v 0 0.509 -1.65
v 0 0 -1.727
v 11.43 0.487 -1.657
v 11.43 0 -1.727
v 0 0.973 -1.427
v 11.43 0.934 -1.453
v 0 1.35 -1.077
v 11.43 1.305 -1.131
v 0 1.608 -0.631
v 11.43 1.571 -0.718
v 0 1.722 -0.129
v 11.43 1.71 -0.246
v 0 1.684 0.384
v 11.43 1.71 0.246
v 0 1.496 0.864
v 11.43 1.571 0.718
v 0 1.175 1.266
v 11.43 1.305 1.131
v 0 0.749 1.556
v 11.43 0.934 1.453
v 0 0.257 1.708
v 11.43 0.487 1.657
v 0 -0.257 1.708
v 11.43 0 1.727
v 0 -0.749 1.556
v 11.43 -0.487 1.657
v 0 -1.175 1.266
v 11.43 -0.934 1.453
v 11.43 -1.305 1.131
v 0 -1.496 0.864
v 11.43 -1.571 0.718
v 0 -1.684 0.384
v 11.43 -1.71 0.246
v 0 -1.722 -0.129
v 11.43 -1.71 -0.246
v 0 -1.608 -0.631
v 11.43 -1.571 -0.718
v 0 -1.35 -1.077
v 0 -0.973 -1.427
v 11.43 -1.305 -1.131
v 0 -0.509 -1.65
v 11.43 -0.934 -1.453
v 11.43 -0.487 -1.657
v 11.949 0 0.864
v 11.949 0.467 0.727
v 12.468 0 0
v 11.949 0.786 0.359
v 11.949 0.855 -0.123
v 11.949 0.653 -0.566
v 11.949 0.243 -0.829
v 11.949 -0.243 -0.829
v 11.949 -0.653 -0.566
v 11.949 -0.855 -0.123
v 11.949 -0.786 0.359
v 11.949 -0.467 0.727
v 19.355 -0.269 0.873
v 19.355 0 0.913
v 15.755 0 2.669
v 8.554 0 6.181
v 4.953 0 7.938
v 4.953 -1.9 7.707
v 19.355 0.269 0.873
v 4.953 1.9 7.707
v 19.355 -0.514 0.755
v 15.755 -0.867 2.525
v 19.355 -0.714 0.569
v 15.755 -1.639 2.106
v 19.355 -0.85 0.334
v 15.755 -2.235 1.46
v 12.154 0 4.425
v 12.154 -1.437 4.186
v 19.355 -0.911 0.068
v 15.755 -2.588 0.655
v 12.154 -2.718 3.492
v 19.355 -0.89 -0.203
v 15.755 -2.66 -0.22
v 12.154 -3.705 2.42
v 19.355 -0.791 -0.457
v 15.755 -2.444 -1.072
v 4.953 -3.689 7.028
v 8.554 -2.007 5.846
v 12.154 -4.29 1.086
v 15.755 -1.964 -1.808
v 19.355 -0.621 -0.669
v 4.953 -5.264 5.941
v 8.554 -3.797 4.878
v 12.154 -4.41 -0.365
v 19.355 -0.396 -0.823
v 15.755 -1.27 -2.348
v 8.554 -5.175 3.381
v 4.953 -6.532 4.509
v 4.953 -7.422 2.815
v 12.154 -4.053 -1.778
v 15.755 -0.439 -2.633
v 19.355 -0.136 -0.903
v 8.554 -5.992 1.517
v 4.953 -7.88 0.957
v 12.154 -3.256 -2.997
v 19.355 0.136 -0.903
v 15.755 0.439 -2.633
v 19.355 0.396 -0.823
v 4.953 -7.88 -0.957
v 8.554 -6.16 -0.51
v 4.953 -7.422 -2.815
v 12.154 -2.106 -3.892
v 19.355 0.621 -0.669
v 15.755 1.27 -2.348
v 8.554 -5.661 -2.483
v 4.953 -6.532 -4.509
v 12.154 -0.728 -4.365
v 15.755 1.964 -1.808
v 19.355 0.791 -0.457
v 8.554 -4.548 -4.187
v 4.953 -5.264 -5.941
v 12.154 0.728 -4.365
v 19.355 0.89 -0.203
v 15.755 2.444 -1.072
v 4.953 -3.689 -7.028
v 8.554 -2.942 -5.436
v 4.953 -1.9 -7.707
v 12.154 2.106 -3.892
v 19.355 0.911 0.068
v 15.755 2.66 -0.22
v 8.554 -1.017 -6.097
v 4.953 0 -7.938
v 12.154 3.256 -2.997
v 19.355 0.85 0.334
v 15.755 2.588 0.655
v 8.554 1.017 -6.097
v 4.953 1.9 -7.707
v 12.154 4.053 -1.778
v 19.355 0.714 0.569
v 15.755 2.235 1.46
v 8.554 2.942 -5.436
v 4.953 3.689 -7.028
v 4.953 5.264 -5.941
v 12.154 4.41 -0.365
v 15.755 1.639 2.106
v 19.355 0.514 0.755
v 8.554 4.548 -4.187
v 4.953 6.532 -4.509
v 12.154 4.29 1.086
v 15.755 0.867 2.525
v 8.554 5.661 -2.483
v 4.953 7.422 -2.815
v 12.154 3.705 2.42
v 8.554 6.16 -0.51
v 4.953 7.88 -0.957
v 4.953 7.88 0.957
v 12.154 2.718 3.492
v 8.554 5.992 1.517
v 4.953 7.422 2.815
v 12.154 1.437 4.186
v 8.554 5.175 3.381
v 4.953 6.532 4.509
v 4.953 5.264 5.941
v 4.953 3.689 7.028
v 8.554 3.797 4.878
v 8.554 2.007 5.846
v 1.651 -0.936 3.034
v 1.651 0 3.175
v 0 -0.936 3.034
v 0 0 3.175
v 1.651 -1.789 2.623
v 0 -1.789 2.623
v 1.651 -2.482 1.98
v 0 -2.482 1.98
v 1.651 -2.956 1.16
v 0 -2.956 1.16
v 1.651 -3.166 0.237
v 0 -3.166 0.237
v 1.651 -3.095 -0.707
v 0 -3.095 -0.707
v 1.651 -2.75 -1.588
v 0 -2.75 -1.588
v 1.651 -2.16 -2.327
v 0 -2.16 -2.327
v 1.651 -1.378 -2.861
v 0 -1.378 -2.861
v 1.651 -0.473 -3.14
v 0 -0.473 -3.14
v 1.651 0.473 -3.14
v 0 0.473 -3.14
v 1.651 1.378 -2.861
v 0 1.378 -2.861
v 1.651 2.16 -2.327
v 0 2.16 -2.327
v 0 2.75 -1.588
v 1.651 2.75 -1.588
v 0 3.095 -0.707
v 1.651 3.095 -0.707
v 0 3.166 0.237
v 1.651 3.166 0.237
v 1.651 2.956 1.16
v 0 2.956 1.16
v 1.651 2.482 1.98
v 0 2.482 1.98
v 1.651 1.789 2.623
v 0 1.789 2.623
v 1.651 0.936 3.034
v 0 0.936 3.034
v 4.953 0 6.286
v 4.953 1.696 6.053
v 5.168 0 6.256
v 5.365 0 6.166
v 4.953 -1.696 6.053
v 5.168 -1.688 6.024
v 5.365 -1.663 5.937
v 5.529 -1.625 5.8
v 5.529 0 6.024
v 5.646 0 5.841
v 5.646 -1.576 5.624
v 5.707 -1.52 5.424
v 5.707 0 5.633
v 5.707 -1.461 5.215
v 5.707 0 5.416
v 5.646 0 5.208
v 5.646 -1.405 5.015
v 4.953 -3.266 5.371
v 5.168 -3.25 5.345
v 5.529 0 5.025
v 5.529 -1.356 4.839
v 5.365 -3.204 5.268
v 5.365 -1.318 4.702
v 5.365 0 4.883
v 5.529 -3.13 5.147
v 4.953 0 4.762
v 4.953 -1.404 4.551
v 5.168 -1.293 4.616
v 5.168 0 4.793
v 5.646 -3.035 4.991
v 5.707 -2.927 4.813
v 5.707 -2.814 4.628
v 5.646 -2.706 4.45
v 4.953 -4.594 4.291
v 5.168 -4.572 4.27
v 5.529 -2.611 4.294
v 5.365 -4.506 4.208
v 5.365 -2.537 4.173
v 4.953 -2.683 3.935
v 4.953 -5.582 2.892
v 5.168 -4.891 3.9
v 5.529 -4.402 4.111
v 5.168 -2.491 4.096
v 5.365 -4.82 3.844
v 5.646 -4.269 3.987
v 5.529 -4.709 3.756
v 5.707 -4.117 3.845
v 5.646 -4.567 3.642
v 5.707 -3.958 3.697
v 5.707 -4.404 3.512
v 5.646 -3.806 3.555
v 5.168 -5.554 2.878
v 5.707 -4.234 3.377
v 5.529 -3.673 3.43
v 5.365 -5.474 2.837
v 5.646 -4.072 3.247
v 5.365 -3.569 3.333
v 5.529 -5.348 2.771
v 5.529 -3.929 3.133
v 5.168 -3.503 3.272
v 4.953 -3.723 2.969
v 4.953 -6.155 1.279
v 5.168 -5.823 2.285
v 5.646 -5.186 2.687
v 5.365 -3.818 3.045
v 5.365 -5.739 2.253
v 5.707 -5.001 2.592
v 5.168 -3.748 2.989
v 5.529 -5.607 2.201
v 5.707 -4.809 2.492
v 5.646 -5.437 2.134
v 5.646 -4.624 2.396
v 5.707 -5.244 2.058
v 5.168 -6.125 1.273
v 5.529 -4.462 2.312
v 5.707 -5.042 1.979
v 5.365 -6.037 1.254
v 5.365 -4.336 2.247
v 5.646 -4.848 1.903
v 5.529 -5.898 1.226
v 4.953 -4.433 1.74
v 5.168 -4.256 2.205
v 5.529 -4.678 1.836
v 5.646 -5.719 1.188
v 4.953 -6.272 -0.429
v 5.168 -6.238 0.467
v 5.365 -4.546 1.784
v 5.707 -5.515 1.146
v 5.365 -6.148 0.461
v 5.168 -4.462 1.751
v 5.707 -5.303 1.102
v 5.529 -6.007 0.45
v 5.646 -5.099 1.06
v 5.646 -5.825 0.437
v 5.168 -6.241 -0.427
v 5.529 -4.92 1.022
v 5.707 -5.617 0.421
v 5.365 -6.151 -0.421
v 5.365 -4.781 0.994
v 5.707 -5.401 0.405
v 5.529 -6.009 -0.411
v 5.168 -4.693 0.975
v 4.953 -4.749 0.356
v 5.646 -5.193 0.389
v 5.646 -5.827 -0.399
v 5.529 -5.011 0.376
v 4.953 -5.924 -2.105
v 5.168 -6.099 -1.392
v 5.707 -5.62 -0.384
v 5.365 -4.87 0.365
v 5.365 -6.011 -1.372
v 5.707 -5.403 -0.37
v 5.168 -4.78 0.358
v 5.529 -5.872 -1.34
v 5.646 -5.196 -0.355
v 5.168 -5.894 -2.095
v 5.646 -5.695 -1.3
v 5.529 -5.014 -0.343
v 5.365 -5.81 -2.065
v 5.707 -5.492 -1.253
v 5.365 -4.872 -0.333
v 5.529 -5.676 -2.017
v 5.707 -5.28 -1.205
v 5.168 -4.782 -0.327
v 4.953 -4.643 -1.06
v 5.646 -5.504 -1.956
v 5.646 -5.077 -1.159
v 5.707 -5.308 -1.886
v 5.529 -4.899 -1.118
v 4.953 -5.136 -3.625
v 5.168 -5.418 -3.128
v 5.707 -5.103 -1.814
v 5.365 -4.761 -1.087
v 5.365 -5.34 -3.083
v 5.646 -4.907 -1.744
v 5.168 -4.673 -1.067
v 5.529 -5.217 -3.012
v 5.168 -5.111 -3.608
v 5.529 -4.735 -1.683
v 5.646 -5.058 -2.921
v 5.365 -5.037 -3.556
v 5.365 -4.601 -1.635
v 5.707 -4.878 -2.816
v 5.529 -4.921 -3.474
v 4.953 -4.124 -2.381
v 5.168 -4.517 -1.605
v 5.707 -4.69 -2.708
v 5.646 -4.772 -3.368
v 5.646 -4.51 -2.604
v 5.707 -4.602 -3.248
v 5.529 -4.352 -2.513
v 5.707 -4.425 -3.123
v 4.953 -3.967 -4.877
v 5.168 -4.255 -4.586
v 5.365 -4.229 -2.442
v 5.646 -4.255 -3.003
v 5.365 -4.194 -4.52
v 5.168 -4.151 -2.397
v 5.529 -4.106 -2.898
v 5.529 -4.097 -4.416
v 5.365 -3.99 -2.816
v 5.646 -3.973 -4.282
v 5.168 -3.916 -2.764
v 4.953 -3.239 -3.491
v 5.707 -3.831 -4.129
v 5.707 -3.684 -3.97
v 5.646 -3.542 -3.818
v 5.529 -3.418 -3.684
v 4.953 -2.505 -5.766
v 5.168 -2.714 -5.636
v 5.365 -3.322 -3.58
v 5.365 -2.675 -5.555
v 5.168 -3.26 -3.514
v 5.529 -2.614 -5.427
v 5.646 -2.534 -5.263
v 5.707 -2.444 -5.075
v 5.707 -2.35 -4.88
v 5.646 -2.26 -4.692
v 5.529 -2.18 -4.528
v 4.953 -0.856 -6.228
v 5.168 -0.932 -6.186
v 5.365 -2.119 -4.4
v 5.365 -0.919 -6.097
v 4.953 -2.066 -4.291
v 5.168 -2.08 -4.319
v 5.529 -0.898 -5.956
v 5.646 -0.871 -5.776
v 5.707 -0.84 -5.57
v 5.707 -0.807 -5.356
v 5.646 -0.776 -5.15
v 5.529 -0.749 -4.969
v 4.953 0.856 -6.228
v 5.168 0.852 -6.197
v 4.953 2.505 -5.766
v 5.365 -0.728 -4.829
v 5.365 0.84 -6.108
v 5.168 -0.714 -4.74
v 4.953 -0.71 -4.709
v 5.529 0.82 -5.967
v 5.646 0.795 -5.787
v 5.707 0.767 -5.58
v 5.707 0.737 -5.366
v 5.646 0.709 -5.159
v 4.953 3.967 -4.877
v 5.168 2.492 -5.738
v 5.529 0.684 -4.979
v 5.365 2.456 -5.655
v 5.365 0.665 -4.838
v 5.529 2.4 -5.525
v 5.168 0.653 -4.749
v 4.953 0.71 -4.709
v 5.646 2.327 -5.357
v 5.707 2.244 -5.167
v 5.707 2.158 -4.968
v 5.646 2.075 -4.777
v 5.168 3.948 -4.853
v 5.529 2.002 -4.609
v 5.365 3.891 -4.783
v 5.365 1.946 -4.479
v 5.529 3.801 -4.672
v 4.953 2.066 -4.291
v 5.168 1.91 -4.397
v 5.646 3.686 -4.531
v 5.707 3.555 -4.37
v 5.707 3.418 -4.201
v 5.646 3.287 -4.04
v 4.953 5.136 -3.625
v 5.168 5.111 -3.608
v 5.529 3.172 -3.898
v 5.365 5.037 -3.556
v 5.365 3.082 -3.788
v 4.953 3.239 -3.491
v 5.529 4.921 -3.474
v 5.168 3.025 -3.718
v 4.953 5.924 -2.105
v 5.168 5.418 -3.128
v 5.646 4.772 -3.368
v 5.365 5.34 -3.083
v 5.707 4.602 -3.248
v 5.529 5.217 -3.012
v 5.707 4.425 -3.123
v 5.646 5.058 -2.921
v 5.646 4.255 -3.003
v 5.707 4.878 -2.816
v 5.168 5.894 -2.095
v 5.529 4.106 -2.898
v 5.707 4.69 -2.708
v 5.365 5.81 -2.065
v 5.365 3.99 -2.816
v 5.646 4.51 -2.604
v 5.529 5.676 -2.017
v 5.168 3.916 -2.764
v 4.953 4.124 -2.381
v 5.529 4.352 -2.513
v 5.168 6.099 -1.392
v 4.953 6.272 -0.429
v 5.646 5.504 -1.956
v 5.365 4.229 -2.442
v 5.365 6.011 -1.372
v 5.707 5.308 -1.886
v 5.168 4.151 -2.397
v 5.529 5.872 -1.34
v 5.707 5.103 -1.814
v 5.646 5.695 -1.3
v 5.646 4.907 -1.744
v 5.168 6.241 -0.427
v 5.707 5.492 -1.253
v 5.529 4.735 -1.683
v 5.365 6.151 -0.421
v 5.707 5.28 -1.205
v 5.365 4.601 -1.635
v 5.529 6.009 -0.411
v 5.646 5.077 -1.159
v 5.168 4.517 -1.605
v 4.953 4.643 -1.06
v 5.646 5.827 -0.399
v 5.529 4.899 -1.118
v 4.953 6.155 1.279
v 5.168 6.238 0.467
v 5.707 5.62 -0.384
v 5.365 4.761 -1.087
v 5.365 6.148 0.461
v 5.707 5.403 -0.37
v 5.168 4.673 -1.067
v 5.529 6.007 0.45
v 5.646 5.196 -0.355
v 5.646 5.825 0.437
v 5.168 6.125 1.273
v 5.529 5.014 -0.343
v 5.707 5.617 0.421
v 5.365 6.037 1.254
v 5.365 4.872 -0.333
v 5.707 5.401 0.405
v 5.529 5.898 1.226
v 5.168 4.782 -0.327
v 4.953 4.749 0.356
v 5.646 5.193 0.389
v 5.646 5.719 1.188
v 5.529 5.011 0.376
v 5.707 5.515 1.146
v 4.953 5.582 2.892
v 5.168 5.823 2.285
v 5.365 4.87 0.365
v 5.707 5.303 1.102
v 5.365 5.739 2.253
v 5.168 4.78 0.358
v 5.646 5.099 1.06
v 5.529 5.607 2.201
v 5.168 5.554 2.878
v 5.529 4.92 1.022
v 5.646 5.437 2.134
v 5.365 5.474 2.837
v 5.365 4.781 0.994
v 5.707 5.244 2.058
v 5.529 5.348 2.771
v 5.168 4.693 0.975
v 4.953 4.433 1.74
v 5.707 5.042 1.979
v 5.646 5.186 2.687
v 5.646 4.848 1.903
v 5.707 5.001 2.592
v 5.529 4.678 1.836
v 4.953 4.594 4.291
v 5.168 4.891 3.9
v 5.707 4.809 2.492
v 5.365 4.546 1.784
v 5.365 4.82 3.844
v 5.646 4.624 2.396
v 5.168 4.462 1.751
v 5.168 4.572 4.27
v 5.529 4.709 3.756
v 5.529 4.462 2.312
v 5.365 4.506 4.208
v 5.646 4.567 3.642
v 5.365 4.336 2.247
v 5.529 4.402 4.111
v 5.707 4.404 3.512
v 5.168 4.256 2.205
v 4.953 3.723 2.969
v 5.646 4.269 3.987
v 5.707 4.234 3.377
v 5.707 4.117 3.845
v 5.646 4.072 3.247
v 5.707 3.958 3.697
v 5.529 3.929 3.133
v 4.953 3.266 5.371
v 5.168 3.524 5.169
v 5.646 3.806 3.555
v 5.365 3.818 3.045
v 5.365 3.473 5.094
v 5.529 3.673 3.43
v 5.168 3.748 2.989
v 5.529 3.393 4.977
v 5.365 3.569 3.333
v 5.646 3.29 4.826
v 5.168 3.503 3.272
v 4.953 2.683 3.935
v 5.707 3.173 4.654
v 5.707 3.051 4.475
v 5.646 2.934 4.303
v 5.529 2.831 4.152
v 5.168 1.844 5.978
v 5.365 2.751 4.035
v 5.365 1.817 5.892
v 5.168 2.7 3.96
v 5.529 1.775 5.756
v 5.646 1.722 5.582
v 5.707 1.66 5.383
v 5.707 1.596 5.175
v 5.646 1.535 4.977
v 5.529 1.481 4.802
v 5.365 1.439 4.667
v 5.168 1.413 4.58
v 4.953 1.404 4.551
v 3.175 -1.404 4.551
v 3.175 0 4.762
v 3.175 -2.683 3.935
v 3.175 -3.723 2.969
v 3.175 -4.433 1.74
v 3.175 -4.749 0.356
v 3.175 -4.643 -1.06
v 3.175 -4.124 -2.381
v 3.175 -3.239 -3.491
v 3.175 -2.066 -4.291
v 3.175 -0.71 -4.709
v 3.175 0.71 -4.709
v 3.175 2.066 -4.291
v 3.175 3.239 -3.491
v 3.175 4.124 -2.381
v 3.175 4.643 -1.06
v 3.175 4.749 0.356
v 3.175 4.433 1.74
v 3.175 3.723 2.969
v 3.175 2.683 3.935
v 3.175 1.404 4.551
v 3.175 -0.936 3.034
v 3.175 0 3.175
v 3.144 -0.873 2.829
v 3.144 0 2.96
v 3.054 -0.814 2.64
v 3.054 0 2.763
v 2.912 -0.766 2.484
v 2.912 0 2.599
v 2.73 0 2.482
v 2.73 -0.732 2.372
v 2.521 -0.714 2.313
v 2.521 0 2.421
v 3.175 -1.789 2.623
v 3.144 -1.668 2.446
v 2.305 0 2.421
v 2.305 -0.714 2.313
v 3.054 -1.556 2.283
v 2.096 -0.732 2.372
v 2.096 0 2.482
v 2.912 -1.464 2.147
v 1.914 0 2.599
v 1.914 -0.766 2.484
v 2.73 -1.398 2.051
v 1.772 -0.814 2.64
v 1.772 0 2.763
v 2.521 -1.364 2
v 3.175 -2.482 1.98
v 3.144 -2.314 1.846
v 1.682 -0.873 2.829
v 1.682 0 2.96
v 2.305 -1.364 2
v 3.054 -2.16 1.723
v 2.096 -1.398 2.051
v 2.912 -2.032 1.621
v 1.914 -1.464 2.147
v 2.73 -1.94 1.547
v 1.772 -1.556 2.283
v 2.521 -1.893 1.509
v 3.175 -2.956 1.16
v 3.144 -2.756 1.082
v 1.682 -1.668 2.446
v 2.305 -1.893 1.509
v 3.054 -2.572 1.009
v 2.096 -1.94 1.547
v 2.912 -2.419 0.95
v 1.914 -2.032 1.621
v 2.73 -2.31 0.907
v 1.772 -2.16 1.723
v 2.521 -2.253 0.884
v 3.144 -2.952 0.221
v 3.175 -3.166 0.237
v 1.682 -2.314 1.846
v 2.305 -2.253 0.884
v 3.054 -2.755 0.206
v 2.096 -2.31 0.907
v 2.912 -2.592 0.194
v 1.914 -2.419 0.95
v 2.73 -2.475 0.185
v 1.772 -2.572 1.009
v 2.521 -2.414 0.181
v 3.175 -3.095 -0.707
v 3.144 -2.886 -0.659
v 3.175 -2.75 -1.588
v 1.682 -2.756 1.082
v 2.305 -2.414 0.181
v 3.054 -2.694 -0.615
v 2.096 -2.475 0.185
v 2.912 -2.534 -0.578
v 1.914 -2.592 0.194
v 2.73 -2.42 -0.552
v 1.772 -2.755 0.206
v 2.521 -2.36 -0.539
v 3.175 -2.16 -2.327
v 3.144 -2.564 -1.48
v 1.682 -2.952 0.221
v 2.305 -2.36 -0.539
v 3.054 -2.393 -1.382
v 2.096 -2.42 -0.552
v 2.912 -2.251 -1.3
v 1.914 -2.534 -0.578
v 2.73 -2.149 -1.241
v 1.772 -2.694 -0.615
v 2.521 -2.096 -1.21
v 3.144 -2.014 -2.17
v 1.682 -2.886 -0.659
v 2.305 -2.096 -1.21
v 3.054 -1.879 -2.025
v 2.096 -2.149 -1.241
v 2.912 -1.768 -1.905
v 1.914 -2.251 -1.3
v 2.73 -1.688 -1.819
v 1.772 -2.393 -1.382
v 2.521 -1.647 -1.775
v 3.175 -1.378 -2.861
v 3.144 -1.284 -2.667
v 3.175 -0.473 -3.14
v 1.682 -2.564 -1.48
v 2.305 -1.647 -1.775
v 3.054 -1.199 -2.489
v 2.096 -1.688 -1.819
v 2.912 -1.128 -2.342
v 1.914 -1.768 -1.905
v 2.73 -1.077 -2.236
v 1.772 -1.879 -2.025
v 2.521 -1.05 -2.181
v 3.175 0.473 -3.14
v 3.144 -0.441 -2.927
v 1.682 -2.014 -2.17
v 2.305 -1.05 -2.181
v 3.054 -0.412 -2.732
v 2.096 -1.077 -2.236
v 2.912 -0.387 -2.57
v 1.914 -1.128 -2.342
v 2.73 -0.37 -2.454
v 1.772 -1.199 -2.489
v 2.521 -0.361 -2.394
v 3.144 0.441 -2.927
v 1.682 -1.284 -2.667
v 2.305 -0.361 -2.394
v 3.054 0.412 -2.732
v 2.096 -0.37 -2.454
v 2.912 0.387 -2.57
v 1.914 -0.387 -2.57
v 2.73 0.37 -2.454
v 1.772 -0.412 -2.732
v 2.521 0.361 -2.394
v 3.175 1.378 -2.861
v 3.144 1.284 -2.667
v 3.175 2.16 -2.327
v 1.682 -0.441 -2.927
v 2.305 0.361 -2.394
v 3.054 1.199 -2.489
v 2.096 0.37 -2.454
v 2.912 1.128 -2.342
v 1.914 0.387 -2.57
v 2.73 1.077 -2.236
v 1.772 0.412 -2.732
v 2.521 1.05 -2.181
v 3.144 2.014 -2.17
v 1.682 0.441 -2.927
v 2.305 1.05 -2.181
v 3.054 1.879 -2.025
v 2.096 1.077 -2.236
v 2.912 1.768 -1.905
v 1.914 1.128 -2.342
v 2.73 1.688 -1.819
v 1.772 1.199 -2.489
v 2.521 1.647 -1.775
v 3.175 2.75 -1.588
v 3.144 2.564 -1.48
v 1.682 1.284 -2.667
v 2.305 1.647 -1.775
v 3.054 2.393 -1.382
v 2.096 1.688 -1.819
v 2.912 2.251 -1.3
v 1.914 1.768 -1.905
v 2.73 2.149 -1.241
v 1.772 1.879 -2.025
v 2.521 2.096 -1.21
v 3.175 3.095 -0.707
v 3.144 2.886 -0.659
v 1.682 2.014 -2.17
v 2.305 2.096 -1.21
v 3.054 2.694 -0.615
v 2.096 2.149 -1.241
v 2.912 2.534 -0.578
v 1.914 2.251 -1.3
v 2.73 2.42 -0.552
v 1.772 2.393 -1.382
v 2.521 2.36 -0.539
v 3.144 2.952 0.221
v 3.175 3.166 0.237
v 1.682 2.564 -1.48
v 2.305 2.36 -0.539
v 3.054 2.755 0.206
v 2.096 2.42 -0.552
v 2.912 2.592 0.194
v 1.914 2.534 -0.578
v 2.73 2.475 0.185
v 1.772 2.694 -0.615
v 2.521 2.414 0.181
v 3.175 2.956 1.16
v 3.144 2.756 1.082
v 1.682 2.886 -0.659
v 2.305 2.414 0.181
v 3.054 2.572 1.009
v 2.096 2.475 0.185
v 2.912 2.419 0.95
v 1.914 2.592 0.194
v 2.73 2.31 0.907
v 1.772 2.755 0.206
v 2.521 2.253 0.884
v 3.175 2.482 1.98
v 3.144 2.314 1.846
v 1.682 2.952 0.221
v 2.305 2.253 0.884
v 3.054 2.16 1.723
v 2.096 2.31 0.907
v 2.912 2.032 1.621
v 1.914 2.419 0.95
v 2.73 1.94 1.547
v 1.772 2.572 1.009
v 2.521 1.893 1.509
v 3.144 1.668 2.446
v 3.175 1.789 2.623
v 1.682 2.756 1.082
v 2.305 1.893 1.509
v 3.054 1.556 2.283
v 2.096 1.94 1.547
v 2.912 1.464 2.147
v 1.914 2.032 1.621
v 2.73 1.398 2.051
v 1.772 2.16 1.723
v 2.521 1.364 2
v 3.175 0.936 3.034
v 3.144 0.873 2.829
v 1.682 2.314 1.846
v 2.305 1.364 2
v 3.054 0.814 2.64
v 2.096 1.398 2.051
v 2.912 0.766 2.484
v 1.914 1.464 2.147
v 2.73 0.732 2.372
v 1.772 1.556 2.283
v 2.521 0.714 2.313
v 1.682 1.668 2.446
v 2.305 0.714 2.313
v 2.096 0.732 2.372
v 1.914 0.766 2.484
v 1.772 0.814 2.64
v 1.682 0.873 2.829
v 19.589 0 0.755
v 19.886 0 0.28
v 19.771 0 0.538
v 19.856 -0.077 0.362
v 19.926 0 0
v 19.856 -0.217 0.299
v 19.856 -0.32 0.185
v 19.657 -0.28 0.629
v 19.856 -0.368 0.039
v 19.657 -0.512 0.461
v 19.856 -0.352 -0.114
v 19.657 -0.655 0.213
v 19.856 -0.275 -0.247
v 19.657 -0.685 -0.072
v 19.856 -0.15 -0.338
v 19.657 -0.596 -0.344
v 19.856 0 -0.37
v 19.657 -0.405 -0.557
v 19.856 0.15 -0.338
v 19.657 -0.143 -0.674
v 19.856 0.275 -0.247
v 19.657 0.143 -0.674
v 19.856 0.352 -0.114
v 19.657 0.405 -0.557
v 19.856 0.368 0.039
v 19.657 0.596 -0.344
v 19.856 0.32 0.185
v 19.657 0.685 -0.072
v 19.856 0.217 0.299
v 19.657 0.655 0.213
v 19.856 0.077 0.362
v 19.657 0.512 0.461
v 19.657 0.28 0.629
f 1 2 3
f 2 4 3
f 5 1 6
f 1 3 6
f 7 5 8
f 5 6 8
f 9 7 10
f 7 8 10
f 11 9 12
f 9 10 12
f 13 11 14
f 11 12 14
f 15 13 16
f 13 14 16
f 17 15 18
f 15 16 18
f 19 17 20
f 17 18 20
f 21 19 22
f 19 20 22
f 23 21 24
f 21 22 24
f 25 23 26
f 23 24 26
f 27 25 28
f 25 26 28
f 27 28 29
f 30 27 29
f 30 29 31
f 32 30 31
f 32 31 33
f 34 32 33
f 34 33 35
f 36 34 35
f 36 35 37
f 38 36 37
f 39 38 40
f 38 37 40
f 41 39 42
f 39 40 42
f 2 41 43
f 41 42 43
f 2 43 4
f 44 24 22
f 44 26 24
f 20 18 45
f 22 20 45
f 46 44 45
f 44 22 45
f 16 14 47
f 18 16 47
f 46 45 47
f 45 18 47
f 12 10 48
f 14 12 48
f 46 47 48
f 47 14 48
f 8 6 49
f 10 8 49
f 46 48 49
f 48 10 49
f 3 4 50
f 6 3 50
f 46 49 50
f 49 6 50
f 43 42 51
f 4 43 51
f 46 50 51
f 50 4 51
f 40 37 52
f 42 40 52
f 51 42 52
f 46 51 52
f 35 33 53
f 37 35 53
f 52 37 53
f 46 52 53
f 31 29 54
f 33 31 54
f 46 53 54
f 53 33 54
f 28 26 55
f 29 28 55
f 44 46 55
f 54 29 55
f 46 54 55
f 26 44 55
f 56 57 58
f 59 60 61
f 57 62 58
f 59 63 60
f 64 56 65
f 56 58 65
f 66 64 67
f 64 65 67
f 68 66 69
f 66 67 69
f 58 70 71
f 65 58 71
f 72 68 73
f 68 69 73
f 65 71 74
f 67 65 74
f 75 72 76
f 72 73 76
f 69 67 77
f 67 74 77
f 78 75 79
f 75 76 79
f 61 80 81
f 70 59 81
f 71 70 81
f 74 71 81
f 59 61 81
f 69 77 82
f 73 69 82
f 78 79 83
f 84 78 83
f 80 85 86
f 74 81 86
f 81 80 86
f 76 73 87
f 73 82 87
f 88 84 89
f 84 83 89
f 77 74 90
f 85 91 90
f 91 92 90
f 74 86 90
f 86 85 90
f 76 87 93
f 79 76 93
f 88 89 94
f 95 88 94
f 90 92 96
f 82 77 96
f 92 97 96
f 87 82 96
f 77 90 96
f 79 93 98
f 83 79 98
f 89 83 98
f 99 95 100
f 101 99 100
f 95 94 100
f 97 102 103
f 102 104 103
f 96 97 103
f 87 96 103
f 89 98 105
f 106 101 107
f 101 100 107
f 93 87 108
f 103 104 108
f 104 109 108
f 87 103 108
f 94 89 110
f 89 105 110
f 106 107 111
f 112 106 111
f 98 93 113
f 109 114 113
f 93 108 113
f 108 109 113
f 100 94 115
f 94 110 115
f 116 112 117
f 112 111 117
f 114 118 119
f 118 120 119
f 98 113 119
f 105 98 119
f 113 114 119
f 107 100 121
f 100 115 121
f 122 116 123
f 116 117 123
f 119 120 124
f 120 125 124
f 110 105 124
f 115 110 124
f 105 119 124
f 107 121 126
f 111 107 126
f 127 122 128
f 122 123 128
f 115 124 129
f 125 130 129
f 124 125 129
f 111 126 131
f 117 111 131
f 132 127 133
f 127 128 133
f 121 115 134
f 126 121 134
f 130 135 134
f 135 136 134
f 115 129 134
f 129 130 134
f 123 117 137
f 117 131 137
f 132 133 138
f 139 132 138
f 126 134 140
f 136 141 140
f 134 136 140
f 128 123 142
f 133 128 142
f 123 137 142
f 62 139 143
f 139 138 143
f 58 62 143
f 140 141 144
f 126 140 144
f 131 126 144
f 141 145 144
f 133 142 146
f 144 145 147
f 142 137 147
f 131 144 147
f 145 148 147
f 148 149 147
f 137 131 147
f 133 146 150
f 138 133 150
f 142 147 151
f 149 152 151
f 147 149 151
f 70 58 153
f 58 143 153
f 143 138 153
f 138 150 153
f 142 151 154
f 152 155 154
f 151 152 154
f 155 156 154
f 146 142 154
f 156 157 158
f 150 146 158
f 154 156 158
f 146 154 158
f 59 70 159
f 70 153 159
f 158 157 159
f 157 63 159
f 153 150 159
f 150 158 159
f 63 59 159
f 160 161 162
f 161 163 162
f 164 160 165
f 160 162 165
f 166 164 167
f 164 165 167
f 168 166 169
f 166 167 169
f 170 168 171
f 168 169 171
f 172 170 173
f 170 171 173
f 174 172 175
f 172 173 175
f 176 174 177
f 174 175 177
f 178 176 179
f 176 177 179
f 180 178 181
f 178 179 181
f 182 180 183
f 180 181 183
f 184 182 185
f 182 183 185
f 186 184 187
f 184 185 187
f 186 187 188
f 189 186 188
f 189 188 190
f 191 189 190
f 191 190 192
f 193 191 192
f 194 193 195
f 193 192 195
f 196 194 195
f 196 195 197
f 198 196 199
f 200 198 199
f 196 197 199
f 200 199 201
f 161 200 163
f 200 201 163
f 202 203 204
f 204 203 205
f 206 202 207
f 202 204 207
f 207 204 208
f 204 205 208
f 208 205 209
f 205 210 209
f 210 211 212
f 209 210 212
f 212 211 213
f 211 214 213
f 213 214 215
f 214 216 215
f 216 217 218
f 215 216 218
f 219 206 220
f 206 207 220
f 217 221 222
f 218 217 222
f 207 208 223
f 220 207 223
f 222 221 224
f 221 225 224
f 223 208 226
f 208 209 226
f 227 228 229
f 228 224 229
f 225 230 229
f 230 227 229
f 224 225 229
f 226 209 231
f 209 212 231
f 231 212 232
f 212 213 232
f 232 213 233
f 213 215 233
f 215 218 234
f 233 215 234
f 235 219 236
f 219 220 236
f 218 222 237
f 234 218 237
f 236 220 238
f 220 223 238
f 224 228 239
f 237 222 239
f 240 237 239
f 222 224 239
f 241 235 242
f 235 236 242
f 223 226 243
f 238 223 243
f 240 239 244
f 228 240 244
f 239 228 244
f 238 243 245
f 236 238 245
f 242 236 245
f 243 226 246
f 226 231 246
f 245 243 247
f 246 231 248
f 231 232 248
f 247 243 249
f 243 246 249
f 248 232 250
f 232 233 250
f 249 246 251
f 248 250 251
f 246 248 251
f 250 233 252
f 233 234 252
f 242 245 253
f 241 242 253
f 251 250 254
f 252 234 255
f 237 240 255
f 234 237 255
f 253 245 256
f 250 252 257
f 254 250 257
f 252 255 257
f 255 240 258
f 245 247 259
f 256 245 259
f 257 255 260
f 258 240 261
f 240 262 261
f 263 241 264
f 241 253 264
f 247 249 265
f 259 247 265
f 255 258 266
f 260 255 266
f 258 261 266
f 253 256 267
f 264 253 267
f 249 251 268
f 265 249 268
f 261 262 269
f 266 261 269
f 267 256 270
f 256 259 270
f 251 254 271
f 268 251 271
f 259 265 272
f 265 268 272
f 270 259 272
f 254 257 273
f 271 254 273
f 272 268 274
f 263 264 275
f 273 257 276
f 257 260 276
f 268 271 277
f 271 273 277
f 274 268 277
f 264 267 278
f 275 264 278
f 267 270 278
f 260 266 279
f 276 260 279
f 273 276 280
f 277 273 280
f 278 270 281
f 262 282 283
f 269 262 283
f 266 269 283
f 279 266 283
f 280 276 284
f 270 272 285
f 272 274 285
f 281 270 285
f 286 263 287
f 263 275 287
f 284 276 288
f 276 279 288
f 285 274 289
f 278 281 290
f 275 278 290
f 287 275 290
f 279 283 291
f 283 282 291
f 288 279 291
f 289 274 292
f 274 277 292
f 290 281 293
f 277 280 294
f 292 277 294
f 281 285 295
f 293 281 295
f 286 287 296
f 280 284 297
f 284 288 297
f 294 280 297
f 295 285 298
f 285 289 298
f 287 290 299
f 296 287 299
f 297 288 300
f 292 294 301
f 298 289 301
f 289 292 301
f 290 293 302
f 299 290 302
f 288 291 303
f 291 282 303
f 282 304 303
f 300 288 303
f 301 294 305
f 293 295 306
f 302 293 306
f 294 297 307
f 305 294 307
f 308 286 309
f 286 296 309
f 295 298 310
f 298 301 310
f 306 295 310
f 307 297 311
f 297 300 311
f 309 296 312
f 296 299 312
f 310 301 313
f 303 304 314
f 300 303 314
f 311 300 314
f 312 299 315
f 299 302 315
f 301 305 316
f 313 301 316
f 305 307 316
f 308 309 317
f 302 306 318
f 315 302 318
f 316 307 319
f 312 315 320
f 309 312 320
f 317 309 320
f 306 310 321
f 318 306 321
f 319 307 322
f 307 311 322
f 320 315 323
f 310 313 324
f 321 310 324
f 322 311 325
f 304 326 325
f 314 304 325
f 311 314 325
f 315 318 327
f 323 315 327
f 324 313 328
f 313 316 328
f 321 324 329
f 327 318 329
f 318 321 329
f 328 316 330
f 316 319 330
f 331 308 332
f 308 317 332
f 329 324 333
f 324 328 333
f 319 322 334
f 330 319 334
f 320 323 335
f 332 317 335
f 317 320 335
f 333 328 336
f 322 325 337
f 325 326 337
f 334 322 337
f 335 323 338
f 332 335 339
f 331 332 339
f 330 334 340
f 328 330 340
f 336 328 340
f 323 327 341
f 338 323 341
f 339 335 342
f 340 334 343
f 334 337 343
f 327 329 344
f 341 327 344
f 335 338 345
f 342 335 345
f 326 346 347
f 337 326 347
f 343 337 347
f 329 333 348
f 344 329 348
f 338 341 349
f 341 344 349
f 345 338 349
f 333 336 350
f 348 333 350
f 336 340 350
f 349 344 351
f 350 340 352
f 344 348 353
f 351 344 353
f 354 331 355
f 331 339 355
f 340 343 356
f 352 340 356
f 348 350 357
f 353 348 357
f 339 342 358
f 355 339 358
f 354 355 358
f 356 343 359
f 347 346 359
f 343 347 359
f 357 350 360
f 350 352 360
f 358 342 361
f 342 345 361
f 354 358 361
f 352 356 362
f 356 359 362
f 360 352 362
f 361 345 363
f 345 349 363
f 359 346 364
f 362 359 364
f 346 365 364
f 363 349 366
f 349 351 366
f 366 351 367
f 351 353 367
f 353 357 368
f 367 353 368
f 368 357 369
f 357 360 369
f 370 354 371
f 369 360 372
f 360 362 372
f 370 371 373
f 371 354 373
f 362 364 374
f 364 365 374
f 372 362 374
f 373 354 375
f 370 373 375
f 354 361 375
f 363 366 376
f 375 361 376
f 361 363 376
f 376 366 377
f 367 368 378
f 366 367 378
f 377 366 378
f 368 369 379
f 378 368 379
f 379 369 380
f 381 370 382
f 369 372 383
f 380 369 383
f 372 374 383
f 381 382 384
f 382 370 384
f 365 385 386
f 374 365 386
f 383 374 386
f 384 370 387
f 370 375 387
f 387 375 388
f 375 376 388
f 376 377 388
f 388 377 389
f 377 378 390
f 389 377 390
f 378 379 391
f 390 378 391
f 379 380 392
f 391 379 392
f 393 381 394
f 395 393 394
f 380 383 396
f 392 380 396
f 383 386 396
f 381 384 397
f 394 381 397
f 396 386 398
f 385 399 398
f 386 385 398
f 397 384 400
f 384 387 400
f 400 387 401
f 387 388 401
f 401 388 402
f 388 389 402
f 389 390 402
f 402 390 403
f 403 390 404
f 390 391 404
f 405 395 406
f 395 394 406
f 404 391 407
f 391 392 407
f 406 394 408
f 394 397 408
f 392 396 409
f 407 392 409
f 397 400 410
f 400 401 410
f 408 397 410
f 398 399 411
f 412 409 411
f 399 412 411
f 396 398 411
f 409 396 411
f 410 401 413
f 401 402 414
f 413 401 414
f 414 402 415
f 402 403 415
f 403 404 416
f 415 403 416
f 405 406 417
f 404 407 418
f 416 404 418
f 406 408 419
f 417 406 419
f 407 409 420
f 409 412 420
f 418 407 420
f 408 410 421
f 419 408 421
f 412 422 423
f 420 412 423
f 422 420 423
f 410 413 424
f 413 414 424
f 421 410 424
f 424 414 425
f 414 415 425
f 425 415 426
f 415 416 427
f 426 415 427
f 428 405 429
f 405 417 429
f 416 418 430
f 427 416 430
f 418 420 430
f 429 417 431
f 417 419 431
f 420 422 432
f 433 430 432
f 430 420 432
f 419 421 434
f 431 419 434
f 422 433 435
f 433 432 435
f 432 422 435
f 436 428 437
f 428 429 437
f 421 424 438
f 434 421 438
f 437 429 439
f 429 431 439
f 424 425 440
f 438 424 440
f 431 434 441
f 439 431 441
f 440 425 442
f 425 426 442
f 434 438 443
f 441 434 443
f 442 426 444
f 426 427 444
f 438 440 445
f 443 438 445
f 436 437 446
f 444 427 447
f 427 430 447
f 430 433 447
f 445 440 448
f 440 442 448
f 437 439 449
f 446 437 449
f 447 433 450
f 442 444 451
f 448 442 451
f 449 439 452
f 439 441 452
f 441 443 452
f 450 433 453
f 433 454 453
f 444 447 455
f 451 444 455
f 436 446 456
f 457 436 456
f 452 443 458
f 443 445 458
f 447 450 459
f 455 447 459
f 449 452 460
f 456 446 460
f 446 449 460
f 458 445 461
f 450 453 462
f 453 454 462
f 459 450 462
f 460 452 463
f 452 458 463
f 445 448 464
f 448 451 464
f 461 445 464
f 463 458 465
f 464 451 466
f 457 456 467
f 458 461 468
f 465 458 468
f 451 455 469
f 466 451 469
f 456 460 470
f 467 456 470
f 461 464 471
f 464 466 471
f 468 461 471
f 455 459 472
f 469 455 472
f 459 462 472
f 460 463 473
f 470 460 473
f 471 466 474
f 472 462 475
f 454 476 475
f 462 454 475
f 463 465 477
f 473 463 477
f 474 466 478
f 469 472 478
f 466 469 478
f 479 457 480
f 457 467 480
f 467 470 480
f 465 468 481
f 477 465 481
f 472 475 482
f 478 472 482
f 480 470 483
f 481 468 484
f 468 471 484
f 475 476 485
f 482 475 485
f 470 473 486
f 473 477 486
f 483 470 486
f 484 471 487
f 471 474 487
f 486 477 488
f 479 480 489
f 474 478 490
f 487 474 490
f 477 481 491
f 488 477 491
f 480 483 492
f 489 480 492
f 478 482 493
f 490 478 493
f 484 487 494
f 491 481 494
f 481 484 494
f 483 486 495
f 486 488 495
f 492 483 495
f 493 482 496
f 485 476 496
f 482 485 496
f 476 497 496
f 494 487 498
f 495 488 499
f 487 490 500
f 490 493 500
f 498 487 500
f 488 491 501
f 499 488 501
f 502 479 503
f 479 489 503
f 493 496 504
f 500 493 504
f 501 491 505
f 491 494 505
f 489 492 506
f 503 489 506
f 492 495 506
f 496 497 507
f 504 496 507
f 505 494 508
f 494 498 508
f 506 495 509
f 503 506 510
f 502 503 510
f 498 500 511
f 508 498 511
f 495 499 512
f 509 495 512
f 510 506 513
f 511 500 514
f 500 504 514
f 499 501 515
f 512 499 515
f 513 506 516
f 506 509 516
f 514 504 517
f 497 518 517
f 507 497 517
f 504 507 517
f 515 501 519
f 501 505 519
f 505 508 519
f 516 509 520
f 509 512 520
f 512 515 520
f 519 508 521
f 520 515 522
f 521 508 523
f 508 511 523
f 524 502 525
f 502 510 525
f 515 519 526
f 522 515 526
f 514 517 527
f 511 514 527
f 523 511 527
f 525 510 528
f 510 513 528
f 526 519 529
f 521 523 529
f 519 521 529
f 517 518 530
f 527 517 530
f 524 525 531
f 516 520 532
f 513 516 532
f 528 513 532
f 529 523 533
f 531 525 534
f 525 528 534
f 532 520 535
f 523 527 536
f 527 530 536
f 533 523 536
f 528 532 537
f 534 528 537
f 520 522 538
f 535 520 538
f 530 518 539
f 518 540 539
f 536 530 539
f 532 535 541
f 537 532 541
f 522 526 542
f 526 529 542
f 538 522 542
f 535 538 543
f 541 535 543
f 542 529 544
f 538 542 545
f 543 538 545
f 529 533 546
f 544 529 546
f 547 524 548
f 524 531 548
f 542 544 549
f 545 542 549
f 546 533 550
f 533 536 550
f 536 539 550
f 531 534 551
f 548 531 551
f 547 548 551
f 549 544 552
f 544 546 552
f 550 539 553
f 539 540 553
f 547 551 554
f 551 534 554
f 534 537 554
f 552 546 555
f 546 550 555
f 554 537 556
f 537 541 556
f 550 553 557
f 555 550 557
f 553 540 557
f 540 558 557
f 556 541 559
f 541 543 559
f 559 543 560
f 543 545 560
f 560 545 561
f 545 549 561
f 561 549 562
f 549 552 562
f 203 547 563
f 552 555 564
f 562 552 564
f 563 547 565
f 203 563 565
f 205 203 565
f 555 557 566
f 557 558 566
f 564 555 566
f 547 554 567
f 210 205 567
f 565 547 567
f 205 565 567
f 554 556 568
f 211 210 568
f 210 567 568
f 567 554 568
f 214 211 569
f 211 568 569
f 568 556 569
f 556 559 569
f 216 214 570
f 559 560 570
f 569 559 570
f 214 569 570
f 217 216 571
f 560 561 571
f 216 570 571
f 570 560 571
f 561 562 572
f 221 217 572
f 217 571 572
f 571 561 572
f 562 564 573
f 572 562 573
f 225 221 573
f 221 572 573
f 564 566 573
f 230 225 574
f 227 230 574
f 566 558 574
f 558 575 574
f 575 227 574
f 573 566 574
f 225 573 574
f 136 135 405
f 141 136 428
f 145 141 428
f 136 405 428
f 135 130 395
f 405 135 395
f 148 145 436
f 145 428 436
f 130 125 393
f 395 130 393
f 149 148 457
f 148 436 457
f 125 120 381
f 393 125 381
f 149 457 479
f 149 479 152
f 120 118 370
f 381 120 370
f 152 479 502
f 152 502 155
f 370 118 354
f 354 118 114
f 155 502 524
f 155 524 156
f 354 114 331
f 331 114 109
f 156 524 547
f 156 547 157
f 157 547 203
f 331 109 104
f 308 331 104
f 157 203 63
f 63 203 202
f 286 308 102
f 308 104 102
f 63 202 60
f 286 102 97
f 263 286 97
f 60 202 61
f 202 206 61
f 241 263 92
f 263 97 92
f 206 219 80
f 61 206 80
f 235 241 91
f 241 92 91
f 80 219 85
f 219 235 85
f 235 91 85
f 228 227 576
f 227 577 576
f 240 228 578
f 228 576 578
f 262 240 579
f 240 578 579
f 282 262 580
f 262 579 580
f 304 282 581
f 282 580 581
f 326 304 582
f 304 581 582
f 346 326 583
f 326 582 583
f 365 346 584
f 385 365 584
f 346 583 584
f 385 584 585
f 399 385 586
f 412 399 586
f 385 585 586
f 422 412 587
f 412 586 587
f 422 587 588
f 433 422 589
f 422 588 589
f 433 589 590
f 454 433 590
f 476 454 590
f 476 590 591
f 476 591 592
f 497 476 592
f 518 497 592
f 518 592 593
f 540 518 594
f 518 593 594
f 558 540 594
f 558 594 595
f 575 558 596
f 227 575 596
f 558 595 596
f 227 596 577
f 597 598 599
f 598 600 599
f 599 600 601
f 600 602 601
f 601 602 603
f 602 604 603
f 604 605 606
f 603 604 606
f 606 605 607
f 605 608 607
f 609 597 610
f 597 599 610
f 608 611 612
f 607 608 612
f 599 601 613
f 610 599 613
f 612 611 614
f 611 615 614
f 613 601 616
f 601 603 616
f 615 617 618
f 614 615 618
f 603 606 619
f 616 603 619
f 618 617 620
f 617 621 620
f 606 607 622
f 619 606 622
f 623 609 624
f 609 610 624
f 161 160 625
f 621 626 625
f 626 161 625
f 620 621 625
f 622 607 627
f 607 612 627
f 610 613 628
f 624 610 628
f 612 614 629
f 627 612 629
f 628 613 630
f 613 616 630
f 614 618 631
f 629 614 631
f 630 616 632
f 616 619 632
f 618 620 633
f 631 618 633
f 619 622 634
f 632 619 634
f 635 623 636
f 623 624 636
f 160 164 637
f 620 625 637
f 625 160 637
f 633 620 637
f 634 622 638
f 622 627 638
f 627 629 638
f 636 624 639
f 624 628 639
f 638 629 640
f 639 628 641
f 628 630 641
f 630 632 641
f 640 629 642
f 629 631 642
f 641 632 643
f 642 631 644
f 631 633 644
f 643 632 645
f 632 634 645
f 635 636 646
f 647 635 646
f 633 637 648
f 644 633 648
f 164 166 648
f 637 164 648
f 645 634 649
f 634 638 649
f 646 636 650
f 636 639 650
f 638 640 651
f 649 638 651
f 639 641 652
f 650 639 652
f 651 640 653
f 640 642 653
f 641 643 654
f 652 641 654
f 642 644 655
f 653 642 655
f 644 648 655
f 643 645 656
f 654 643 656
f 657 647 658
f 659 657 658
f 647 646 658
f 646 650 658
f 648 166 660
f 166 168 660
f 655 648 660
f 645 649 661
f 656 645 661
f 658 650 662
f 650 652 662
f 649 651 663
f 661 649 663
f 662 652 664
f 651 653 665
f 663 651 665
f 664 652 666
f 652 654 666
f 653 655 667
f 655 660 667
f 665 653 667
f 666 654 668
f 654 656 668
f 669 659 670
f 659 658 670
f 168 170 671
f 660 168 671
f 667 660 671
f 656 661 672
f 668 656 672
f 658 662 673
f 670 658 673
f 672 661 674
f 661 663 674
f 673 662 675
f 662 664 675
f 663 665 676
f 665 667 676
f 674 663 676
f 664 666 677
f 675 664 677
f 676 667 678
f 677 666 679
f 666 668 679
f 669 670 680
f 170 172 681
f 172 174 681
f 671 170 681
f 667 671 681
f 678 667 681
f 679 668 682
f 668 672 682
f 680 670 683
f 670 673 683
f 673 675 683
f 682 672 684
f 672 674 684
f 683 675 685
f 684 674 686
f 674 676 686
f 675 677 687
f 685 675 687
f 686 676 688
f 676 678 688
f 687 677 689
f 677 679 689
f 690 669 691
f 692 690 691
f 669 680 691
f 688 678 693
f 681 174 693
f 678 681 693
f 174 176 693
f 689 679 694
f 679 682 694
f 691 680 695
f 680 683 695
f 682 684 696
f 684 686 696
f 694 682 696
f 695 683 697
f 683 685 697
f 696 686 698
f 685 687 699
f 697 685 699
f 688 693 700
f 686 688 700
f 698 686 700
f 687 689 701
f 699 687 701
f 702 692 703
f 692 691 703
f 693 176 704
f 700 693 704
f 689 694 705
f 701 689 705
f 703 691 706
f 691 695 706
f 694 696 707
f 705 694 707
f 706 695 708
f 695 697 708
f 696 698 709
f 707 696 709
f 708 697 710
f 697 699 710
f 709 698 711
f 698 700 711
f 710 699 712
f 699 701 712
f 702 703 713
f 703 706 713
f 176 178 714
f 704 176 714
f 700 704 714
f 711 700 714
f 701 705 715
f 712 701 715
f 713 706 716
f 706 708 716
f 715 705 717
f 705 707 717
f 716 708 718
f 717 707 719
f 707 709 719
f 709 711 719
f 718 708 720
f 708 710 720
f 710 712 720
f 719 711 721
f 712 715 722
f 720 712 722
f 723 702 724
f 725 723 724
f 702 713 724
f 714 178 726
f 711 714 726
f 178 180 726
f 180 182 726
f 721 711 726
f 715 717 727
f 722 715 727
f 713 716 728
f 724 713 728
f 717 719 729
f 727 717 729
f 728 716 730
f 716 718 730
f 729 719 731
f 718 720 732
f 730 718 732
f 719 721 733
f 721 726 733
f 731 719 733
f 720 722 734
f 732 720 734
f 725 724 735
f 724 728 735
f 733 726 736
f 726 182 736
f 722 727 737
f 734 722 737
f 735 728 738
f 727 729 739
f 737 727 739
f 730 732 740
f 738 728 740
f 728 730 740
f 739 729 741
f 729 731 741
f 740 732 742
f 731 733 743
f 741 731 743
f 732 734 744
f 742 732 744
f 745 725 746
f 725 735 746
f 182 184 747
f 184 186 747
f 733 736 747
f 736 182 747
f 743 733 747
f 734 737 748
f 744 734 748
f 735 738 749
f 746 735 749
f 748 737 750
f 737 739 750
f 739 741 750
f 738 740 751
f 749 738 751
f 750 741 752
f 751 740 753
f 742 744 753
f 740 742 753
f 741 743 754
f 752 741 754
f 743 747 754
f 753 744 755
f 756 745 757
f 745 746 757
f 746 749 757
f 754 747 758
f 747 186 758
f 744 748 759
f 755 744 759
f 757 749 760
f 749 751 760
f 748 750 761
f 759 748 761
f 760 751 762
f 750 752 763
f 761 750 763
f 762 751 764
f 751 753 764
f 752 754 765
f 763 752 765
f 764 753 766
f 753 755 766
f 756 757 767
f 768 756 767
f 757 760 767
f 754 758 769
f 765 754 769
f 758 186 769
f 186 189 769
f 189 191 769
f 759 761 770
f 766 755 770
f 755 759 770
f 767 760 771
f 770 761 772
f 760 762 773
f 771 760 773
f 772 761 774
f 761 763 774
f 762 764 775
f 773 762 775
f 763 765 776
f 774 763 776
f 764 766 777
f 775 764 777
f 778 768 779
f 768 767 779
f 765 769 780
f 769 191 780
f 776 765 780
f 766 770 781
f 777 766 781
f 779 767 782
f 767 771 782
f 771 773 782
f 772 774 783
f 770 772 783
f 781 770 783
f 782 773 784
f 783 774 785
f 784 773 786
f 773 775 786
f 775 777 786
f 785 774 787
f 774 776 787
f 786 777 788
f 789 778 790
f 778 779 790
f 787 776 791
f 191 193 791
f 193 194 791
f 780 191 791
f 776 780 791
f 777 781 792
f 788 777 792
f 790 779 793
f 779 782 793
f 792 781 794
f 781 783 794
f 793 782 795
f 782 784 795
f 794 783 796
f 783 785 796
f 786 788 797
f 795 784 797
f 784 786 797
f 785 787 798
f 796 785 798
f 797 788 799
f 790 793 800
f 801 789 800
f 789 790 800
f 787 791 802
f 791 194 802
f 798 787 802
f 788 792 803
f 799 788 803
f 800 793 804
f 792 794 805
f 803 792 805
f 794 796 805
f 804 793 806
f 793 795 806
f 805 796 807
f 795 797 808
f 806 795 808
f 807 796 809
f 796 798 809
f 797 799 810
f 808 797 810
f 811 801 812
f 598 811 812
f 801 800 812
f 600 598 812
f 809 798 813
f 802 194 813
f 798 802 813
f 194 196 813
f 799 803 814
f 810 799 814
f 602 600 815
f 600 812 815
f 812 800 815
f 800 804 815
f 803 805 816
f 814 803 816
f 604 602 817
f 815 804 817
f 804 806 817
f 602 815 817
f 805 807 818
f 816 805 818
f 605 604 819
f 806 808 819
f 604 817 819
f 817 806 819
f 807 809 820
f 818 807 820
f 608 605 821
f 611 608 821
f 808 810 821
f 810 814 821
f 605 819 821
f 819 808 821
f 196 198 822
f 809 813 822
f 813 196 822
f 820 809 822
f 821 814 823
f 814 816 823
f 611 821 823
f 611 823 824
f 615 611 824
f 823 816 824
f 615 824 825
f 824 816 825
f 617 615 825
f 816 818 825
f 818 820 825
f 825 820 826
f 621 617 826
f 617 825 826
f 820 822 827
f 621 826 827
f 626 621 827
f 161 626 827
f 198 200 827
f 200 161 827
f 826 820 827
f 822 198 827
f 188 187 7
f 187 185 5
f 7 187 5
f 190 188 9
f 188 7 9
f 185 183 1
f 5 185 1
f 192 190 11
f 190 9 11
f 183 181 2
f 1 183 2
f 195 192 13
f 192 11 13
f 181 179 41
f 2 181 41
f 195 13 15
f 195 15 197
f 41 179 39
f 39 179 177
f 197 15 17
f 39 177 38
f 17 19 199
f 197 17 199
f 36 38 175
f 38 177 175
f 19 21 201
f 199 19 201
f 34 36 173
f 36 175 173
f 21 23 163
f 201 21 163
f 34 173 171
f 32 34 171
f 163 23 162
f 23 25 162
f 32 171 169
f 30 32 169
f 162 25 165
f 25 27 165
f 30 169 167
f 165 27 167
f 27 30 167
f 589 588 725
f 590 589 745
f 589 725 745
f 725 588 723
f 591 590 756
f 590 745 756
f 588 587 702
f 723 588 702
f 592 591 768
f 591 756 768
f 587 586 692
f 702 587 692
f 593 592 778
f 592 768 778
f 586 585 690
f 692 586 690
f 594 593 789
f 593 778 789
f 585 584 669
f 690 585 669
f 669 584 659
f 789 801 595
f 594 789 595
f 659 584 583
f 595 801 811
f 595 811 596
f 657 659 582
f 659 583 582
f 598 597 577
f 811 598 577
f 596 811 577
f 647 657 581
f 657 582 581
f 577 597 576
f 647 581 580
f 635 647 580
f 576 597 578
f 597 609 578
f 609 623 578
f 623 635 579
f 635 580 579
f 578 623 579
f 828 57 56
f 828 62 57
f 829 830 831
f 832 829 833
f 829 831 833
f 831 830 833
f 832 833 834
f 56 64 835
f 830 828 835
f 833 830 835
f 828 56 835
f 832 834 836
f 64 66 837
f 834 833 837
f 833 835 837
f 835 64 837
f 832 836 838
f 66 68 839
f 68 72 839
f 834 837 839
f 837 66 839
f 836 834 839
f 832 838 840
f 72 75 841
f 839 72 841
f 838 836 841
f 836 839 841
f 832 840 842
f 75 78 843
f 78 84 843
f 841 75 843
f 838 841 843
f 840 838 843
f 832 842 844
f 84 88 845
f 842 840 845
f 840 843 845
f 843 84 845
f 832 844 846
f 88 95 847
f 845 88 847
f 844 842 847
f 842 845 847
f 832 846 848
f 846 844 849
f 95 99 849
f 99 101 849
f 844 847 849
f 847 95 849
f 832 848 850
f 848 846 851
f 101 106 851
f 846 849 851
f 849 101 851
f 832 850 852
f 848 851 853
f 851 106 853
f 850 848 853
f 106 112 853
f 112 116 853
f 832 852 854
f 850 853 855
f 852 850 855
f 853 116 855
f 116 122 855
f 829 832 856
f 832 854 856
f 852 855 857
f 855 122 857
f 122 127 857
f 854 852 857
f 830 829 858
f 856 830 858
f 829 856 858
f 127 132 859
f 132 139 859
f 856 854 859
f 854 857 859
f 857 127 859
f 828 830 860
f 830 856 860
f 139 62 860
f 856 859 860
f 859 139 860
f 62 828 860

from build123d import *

# Parameters (mm, degrees)
F_8_32_TAPPED_HOLE1_D     = 3.4544
F_8_32_TAPPED_HOLE1_DEPTH = 11.43
F_8_32_TAPPED_HOLE1_TIP   = 1.037806461


with BuildPart() as part:
    # Sketch1 one side → Revolve1 (revolve)
    with BuildSketch(Plane.XY, mode=Mode.PRIVATE) as revolve1_sk:
        with BuildLine():
            Line((0, 3.175), (0, 0))
            Line((0, 0), (19.925615957, 0))
            ThreePointArc((19.925615957, 0), (19.771232823, 0.538397972), (19.355001042, 0.913174751))
            Line((19.355001042, 0.913174751), (4.953, 7.9375))
            Line((4.953, 7.9375), (4.953, 6.2865))
            ThreePointArc((4.953, 6.2865), (5.715, 5.5245), (4.953, 4.7625))
            Line((4.953, 4.7625), (3.175, 4.7625))
            Line((3.175, 4.7625), (3.175, 3.175))
            ThreePointArc((3.175, 3.175), (2.413, 2.413), (1.651, 3.175))
            Line((1.651, 3.175), (0, 3.175))
        make_face()
    revolve(revolve1_sk.sketch.rotate(Axis((-1.467236121, 0, 0), (1, 0, 0)), 90), axis=Axis((-1.467236121, 0, 0), (1, 0, 0)))

    # #8-32 Tapped Hole1
    with Locations(Plane.ZY):
        with Locations((0, 0)):
            Hole(F_8_32_TAPPED_HOLE1_D / 2, depth=F_8_32_TAPPED_HOLE1_DEPTH)
            with Locations((0, 0, -(F_8_32_TAPPED_HOLE1_DEPTH + F_8_32_TAPPED_HOLE1_TIP / 2))):  # 118° drill point
                Cone(0, F_8_32_TAPPED_HOLE1_D / 2, F_8_32_TAPPED_HOLE1_TIP, mode=Mode.SUBTRACT)


solid = part.part
